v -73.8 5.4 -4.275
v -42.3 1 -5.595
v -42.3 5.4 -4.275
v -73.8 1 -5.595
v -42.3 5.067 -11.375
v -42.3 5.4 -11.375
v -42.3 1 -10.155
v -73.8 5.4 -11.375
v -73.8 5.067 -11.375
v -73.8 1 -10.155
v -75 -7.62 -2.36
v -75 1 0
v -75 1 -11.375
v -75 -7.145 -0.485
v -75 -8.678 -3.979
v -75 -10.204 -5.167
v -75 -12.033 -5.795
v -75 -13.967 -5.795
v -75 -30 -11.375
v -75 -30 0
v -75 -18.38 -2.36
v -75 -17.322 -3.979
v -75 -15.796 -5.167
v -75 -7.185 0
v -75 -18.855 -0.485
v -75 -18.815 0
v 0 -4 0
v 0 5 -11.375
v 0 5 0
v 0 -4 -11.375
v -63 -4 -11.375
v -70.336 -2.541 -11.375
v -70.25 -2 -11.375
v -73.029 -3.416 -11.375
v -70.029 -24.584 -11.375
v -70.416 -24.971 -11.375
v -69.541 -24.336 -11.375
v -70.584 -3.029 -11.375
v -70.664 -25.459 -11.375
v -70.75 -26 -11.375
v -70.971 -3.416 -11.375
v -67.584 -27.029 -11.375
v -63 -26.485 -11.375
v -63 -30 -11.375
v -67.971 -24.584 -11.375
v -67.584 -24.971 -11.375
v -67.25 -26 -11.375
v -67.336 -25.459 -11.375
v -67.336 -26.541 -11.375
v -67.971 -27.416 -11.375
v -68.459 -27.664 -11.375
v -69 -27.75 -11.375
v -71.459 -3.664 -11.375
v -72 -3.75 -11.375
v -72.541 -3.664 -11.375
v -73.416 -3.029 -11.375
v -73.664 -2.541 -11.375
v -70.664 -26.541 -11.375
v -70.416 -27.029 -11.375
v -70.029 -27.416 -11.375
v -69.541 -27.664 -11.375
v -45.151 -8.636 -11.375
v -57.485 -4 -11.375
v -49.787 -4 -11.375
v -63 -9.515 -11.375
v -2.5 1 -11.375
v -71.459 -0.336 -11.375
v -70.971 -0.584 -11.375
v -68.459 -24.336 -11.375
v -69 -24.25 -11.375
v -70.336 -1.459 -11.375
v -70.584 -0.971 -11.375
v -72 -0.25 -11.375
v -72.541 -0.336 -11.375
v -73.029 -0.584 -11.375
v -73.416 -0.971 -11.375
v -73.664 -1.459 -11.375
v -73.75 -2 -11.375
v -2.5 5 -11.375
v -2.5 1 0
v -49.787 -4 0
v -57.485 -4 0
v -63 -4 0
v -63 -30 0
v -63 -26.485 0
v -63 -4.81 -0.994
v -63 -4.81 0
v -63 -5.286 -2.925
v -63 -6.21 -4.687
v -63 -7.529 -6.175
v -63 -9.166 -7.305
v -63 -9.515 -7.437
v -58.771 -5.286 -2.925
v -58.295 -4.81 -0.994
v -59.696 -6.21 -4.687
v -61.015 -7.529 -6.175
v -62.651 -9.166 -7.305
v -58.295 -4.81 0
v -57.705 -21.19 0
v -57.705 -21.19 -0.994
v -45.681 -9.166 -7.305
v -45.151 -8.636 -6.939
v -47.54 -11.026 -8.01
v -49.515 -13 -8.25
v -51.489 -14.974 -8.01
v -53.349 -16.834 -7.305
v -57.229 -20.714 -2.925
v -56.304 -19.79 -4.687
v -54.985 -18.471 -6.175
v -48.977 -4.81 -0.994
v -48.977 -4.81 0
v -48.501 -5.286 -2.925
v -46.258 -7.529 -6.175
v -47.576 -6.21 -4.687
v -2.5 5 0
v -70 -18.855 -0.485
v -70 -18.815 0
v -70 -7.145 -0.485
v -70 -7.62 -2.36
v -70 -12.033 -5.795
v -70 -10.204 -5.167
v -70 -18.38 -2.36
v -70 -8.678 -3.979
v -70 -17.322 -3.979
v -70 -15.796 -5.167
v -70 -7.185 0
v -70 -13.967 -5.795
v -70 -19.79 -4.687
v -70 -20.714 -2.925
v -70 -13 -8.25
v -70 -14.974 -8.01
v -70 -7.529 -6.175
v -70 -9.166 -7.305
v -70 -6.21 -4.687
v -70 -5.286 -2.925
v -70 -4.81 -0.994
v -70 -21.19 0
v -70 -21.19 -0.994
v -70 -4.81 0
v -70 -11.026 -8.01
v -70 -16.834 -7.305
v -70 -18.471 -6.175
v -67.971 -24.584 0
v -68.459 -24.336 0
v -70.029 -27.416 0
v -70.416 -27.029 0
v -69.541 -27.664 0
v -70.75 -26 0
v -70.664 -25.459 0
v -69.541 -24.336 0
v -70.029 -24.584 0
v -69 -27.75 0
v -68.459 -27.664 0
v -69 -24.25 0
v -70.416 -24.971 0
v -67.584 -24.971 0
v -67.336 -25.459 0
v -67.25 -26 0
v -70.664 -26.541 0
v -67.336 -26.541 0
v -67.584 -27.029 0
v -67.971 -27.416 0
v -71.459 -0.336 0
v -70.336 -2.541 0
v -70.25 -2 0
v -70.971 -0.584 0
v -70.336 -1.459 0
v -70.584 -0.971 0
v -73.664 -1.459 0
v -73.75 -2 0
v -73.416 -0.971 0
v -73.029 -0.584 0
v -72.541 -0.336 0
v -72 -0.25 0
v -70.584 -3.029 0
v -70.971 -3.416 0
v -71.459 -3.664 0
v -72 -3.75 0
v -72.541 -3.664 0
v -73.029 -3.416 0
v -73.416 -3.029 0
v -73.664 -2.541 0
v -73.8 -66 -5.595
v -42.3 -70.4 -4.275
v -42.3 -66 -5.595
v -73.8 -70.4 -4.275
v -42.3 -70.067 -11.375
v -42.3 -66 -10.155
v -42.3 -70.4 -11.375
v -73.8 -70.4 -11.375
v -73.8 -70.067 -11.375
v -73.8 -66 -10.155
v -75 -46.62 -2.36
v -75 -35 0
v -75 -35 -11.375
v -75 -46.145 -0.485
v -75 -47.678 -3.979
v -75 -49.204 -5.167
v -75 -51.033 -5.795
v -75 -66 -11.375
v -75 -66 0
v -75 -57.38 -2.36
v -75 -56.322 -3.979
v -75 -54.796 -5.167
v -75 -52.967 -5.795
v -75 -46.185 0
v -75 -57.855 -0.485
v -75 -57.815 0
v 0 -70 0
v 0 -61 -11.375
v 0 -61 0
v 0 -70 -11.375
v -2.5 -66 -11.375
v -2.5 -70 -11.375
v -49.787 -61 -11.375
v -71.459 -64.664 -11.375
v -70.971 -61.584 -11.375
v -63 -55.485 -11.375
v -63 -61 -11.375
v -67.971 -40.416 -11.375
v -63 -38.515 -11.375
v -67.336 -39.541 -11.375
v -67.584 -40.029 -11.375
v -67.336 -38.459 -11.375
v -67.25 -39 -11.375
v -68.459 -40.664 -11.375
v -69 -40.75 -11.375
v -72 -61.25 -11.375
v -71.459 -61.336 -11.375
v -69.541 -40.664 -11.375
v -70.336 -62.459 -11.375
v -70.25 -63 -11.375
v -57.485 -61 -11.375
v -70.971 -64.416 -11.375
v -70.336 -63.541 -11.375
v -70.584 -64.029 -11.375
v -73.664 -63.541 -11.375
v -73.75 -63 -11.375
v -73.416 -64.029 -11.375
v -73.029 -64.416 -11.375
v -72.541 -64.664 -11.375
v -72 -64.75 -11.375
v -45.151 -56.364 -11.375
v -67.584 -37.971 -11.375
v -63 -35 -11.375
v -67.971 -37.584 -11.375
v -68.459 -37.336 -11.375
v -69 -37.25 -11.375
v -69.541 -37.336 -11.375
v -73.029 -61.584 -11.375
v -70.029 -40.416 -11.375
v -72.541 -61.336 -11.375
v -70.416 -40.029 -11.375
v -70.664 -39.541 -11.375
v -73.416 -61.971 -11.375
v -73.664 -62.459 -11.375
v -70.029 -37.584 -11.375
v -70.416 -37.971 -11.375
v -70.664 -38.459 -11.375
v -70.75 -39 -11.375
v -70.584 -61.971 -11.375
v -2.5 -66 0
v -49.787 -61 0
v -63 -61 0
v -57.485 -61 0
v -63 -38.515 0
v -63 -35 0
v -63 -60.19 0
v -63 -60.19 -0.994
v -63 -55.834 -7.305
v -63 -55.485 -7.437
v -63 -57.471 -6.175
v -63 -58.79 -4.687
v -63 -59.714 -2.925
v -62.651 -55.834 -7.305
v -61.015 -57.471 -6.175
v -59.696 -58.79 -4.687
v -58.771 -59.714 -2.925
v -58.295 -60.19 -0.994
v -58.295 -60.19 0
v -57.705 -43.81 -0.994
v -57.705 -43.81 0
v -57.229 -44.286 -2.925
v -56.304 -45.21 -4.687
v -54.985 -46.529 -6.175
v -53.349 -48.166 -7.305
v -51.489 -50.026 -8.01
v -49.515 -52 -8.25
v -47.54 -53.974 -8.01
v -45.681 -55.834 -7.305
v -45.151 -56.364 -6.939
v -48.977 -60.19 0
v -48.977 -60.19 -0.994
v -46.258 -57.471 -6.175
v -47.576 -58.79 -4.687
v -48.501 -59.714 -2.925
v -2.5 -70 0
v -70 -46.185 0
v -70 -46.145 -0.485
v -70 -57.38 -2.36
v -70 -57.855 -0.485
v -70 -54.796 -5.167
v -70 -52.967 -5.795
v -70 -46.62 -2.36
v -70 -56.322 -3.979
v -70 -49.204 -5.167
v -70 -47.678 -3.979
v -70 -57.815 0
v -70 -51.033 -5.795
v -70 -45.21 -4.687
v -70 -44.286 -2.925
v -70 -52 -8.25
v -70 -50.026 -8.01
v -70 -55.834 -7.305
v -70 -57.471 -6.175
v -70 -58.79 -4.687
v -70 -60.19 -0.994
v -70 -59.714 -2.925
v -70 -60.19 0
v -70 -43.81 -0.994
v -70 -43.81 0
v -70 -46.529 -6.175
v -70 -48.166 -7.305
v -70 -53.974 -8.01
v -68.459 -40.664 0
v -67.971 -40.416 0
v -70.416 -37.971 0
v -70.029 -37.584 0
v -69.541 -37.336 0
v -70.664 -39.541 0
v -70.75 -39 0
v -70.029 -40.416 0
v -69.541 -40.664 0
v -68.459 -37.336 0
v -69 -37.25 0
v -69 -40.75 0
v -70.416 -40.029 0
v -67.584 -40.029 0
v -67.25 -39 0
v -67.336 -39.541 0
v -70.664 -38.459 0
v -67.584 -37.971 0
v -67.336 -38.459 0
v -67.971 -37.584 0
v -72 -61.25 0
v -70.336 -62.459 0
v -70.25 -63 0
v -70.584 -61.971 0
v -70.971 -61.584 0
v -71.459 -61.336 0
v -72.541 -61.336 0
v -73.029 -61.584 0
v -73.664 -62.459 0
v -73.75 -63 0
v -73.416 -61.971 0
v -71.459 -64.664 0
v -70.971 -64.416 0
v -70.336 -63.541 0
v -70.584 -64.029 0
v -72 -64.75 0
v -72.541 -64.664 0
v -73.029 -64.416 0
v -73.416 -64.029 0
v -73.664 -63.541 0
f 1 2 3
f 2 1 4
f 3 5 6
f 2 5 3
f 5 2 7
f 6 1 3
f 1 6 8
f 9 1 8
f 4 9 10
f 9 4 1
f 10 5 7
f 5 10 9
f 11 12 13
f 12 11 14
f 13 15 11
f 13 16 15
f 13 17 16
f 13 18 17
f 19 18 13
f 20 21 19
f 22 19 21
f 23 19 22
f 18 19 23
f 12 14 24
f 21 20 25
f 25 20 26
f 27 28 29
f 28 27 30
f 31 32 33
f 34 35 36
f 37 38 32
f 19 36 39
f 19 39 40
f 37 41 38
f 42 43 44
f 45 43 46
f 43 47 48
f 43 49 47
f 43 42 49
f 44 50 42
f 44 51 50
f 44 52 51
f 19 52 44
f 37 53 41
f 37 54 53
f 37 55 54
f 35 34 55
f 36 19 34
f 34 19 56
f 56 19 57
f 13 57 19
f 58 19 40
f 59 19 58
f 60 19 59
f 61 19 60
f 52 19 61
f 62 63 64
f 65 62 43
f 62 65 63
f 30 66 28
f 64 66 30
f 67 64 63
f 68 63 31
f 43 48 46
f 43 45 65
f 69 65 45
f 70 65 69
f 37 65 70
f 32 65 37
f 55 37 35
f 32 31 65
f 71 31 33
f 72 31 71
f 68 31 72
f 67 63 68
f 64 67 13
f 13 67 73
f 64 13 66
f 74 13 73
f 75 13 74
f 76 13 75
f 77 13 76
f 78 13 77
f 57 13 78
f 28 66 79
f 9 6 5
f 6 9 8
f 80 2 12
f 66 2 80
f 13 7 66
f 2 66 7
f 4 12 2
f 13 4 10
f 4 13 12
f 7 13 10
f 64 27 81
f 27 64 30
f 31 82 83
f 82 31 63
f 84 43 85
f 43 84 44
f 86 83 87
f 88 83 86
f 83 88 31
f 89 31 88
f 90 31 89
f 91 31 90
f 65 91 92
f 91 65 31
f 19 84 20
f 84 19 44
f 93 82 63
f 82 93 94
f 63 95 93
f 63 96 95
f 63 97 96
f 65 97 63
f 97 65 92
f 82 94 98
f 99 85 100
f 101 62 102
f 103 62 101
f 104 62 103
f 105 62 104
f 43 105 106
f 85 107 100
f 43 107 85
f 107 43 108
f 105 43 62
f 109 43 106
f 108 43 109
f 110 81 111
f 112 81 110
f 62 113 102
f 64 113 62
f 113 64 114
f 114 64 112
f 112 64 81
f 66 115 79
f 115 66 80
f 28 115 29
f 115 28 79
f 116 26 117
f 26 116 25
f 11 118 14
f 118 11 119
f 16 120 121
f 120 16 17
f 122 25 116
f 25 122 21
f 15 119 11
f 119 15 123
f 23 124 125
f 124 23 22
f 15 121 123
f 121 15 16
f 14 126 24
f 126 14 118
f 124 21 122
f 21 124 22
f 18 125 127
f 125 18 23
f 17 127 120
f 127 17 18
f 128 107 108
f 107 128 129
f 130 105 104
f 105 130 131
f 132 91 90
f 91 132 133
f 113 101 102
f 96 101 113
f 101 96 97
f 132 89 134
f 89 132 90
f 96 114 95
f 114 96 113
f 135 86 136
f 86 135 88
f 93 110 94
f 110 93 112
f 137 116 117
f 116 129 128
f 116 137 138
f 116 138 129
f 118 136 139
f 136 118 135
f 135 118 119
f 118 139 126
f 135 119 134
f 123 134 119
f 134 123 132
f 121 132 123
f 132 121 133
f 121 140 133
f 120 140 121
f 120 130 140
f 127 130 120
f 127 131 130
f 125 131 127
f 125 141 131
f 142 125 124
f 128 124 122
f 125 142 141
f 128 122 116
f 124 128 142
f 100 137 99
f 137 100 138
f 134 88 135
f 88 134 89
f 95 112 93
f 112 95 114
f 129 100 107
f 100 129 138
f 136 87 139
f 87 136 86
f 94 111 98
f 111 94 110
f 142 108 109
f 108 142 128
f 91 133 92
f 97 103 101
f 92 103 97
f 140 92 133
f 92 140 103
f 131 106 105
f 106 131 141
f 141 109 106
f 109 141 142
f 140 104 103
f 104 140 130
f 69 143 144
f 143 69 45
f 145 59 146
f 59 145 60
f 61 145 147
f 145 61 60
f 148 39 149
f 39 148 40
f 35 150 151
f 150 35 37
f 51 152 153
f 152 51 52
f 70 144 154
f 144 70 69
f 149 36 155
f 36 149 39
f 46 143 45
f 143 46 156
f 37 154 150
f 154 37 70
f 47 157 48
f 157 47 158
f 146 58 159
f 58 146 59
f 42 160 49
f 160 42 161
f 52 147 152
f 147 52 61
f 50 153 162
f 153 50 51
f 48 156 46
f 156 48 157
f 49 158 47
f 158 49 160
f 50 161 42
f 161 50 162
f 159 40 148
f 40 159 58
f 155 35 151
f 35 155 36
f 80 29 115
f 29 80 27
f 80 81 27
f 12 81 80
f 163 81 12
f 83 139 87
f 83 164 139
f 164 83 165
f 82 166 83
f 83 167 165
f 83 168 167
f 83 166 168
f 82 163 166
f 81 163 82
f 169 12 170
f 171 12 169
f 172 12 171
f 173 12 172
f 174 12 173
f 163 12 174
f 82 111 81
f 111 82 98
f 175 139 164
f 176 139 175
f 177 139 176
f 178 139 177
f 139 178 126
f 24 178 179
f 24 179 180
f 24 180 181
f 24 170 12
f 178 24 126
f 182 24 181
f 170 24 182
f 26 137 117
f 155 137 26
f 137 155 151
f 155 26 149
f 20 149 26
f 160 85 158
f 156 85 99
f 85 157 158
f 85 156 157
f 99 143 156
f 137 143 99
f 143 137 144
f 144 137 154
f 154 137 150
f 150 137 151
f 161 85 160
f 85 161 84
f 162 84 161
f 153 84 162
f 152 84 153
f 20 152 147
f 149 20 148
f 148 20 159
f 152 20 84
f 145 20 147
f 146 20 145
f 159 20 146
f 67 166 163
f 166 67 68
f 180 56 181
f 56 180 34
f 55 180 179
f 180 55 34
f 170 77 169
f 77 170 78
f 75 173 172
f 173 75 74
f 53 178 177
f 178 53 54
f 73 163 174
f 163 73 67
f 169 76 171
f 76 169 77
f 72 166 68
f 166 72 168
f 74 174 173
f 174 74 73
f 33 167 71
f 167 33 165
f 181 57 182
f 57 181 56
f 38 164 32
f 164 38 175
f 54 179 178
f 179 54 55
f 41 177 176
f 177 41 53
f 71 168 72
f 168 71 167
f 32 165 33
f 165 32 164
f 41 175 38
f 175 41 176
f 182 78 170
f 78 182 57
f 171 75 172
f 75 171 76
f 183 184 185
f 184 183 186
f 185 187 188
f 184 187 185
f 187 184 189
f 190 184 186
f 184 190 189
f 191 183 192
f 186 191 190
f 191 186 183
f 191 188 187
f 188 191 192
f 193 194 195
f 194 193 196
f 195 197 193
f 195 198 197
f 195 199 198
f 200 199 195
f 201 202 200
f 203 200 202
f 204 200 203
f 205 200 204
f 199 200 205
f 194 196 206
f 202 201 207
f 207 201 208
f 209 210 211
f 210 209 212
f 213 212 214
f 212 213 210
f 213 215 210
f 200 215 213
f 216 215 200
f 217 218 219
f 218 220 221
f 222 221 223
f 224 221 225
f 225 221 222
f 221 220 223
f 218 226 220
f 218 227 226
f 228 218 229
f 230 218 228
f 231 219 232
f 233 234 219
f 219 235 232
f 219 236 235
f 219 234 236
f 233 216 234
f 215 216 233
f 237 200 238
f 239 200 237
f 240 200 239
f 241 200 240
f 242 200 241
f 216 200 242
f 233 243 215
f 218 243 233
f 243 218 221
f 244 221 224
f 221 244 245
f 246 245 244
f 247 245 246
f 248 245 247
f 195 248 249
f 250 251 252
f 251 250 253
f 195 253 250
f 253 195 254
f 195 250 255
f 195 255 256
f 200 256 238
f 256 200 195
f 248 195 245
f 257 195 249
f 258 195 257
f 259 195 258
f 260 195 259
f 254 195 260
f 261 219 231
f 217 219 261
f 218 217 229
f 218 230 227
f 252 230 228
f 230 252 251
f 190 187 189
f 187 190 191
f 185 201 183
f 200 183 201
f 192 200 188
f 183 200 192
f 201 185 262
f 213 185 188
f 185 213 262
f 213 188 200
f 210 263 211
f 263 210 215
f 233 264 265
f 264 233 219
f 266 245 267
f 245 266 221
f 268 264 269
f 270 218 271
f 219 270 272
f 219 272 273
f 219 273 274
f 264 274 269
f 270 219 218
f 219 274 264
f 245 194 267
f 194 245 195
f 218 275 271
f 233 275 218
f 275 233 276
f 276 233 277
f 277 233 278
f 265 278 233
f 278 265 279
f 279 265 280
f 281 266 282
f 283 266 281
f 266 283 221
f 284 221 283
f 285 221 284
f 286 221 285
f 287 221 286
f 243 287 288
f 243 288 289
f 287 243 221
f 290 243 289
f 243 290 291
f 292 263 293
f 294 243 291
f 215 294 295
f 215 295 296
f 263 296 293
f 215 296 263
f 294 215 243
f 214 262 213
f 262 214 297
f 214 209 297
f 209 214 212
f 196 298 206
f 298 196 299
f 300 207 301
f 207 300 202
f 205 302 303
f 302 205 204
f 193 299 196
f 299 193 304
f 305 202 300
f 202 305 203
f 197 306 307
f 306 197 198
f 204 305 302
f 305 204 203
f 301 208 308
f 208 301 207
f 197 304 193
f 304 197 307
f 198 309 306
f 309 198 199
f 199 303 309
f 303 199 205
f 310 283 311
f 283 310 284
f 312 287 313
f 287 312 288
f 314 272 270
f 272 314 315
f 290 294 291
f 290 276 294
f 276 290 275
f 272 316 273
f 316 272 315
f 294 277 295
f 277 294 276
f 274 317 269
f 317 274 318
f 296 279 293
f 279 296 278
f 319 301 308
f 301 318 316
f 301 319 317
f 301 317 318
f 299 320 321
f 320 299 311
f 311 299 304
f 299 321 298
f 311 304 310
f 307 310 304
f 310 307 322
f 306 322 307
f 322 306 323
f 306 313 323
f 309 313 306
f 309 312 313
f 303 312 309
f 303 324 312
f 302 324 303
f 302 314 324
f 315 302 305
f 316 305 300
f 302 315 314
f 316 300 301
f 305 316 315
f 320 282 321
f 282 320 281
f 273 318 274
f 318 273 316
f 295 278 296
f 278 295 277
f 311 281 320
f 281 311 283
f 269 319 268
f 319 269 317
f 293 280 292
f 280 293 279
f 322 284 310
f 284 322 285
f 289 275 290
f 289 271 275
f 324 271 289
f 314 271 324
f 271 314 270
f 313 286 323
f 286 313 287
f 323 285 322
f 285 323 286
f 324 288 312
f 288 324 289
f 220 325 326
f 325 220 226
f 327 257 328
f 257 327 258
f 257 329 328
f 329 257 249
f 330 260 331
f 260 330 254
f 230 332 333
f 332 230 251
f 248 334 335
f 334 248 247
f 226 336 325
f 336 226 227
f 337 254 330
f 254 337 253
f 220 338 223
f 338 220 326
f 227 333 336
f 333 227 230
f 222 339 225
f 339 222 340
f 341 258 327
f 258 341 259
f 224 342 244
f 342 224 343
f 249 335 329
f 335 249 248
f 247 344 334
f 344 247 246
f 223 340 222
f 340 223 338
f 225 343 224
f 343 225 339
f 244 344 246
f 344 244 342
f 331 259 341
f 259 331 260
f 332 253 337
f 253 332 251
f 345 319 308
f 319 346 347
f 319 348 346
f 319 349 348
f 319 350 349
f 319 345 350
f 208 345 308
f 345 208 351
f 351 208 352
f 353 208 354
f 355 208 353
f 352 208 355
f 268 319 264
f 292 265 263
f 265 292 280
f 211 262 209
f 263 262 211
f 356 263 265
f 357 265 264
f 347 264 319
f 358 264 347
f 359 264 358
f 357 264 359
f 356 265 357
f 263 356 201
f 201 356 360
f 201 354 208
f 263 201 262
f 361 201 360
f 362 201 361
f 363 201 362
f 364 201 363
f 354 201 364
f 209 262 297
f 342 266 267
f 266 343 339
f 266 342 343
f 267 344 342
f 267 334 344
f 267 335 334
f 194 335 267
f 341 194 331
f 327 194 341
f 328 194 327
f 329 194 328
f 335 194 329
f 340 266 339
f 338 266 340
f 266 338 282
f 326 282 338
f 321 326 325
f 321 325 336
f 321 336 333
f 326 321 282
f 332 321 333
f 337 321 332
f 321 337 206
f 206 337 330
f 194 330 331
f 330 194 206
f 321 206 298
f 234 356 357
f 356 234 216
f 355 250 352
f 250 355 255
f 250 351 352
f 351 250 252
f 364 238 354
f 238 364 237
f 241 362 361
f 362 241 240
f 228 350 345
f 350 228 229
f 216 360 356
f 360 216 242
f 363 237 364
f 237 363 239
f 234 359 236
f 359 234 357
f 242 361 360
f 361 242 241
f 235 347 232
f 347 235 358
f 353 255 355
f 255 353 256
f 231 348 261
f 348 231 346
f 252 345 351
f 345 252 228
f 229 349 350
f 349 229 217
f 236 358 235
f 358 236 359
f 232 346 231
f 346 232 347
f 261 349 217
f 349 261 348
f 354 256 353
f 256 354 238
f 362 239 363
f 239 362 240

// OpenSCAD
// file: ../../include.scad
//////////////////      END SECTION       //////////////////

	module added_pins(){
		difference(){
			union(){
				translate([30/(15/4),obj_leg*leg_length,30/(15/4)]) pin();
				translate([30/(15/4)+14.5,obj_leg*leg_length,30/(15/4)+14]) pin();
			}
			union(){
							translate([30/(15/4)+13.5,obj_leg*leg_length-20,30/(15/4)+5])cube(size=[2,40,15]);
							translate([30/(15/4)+7.5,obj_leg*leg_length-20,30/(15/4)+15])rotate([0,90,0]) cube(size=[2,40,15]);	

							translate([30/(15/4)-1,obj_leg*leg_length-20,30/(15/4)-8])cube(size=[2,40,15]);
							translate([30/(15/4)-10,obj_leg*leg_length-20,30/(15/4)+1])rotate([0,90,0]) cube(size=[2,40,15]);
			}
		}
	}
	module taken_pins() {
		translate([30/(15/4)+14,obj_leg*leg_length-10,30/(15/4)]) mirror_pin();
		translate([30/(15/4),obj_leg*leg_length-10,30/(15/4)+15]) mirror_pin();
	}


//////////////////      OTHER STUFF       //////////////////

	module holes() {
		rotate([0,0,90]) for(y=[0:other_holes])
		translate([obj_leg+y*15,-15.5,7.5]) union() {
			translate([7.5,0,15]) hole_up();
			hole_down();
		}
	}
	module extend_holes() {
	module top(){
		rotate([0,0,90]) for(y=[0:other_holes+1])
		translate([(30/4)+y*15,-15.5,7.5]) union() {
			translate([7.5,0,15]) hole_up();
		}
	}
	module bottom(){
		rotate([0,0,90]) for(y=[0:other_holes+2])
		translate([(30/4)+y*15,-15.5,7.5]) union() {
			hole_down();
		
}
	}
	union(){
		top();
		bottom();
	}
	}

	module hole() {
		union() {
			rotate([90, 90, 0]) cylinder(h=40, d=hole_pin_diameter, center=true);
			translate([0,7.5,0]) sphere(d=hole_ball_size);
			translate([0,-6,0]) sphere(d=hole_ball_size);
		}
	}
	module hole_up() {
		union() {
			rotate([90, 90, 0]) cylinder(h=40, d=hole_pin_diameter, center=true);
			translate([0,7.5,10]) cylinder(h=hole_pin_height, d=hole_pin_diameter, center=true);
			translate([0,-6,10]) cylinder(h=hole_pin_height, d=hole_pin_diameter, center=true);
			translate([0,7.5,0]) sphere(d=hole_ball_size);
			translate([0,-6,0]) sphere(d=hole_ball_size);
		}
	}
	module hole_down() {
		union() {
			rotate([90, 90, 0]) cylinder(h=40, d=hole_pin_diameter, center=true);
			translate([0,7.5,-10]) cylinder(h=hole_pin_height, d=hole_pin_diameter, center=true);
			translate([0,-6,-10]) cylinder(h=hole_pin_height, d=hole_pin_diameter, center=true);
			translate([0,7.5,0]) sphere(d=hole_ball_size);
			translate([0,-6,0]) sphere(d=hole_ball_size);
		}
	}
	module pin() {
		union() {
			rotate([90, 90, 0]) cylinder(h=pin_height, d=pin_diameter, center=true);
			translate([0,7.5,0]) sphere(d=ball_size);
		}
	}

	module mirror_pin() {
		rotate([90, 90, 0]) cylinder(h=hole_pin_height+small_number, d=hole_pin_diameter, center=true);
		translate([0,-(pin_height-(ball_size/2)),0]) sphere(d=ball_size);
	}


//////////////////      SOME RACK AND Z THINGS       //////////////////

module z_holes() {
    rotate([0,-90,0]) for(z=[0:z_hole_number])
    translate([22.5+z*15,16,-12])
        hole();
}

module pin_cuts() {
	union(){
		cube(size=[2,10,40], center=true);
		rotate([0,0,90]) cube(size=[2,10,40], center=true);
	}
}
module pin_uncut() {
	union(){
		rotate([0, 0, 90]) cylinder(h=hole_pin_height, d=hole_pin_diameter, center=true);
		translate([0,0,10]) sphere(d=ball_hole);
	}
}


module pin_out() {
	union(){
		rotate([0, 0, 90]) cylinder(h=pin_height, d=pin_diameter, center=true);
		translate([0,0,10]) sphere(d= ball_size);
	}
}


module pins_z(){
	difference() {
		pin_out();
		pin_cuts();
	}
}
//////////////////      RACK AND SLIDE     ///////////////////

module straight_pins() {
	for(z=[0:((((obj_leg*leg_length)*2)-(obj_leg*2))/3)/14.5]) rotate([-90,0,0]) translate([z*15,30/(15/4),14]) pins_z();
	for(z=[0:((((obj_leg*leg_length)*2)-(obj_leg*2))/3)/14.5]) rotate([-90,0,0]) translate([z*15,30/(15/4)-14,14]) pins_z();
}
module stagger_pins() {
	for(z=[0:((((obj_leg*leg_length)*2)-(obj_leg*2))/3)/14.5]) rotate([-90,0,0]) translate([z*15,30/(15/4),14]) pins_z();
	for(z=[0:((((obj_leg*leg_length)*2)-(obj_leg*2))/3)/14.5]) rotate([-90,0,0]) translate([z*15+7,30/(15/4)-14,14]) pins_z();
}


//////////////////      DOVE TAIL       //////////////////

module male_dovetail(height) {
	dovetail_3d(max_width,min_width,depth,height);
}

module dovetail_3d(max_width=11, min_width=5, depth=5, height=30) {
	linear_extrude(height=height, convexity=2)
		dovetail_2d(max_width,min_width,depth);
}

module dovetail_2d(max_width=11, min_width=5, depth=5) {
	angle=atan((max_width/2-min_width/2)/depth);
	echo("angle: ", angle);
	polygon(paths=[[0,1,2,3,0]], points=[[-min_width/2,0], [-max_width/2,depth], [max_width/2, depth], [min_width/2,0]]);
}

//bow tie
	module tie_end(height){
				rotate([0,0,0]) translate([0,-0.01,((obj_leg/2)/2)]) male_dovetail(height);
				rotate([0,90,0]) translate([0,-0.01,((obj_leg/2)/2)]) male_dovetail(height);
				rotate([0,180,0]) translate([0,-0.01,((obj_leg/2)/2)]) male_dovetail(height);
				rotate([0,-90,0]) translate([0,-0.01,((obj_leg/2)/2)]) male_dovetail(height);
	}

module bow_support(){
	difference(){
		intersection(){
			translate([-15,0,-15]) cube([30,9,30]);
			scale([1.05,1.05,1.05]) rotate([0,45,0]) tie_end();
		}
		cube([29.2,29.2,29.2], center=true);
	}
}

	module wrap(units){
	for (y = [-1:units-2]) // two iterations, z = -1, z = 1
	{
			translate([15, (y*30)+15, 15]){
			for (r = [0:4]) // two iterations, z = -1, z = 1
			{
				rotate([0,r*90,0]) translate([0,15,15]) rotate([-90,0,0])male_dovetail(height=30);
			}
		}
	}
	}
// file: ../../globals.scad
/*
Most things in this file is represented as one millimeter, so keep that in mind while changing things.
Some of the setting are not mm but at variables that you can set, such as 2*x=2x and you are setting what x is.
I will try to specify when things are variables and not exact measurements.
*/

//Virindi settings
dovetail_male_width_scale = 0.98;
dovetail_male_height_scale = 0.91;

obj_leg = 30;
leg_length = 5.5;
small_number = 0.001;
metal_core_rode_global = 5;


///////////////// number of holes /////////////////////
z_hole_number = 8;
other_holes = 8;

///////////////// Pins /////////////////////

//pins that poke out
ball_size = 10;
pin_height = 20;
pin_diameter = 6;


//holes
hole_ball_size = ball_size;
hole_pin_height = pin_height;
hole_pin_diameter = pin_diameter;

///////////////// Z THINGS /////////////////////

berring_slot_width = 7.5;
berring_slot_depth = 6.5;
metal_core_rode = 5;

///////////////// X THINGS /////////////////////

//male dove tails
max_width=8;
min_width=5;
depth=5;
height=obj_leg/2;

//female dove tails, this is found on the y mounts
girl_max_width=11;
girl_min_width=5;
girl_depth=5;
girl_height=obj_leg;


///////////////// Y THINGS /////////////////////
/*
The Y is so normal that all of those global variables at the top should change all of the setting in it, this section is set her incase there are variables set in the future development of this project.
*/
// main file
include <../../globals.scad>;
include <../../include.scad>;

hotend_depth = 75;
mounting_diamiter = 11.75;
top_diamiter = 16.5;
arm_thickness = 5;
snap_location = 47;
natch_height = 6;


module motor_mount_small(height=15){
	scale([.9,.9,.9]) 	translate([-8.75,1,snap_location]) male_dovetail(35);
}

module y_mount_added(){
	motor_mount_small();
	translate([1,-4+((10-arm_thickness)/2),hotend_depth/2]) cube([24.75,arm_thickness,hotend_depth], center=true);
    translate([1,-15,hotend_depth-(natch_height)]) cube([25,30,natch_height*2],center=true);
	translate([-4,-15,hotend_depth-15]) rotate([-45,0,0]) cube([15,30,natch_height*2],center=true);
	translate([1,1,0]) cube([25,8,5],center=true);
}

module y_mount_taken(){
        translate([0,-13,hotend_depth/2]) cylinder(h=70, d=mounting_diamiter);
	    translate([0,-13,0]) cylinder(h=70, d=top_diamiter);
		translate([0,-26,hotend_depth-natch_height]) rotate([0,-90,0]) cylinder(h=30, d=3.5, $fn=20);
		translate([0,-2,hotend_depth-natch_height+3]) rotate([0,-90,0]) cylinder(h=30, d=3.5, $fn=20);
}
module mount(){
	difference(){
		rotate([0,-90,0]){
			intersection(){
						translate([-15,-30,0]) cube([15,100,100]);
				difference(){
						y_mount_added();
						y_mount_taken();
				}
			}
					translate([-11.5,.7,37.5+(hotend_depth-80)]) cube([7,.3,42.5]);
		}
		translate([-hotend_depth/2,0,(-hotend_depth/2)-22.75/2]) cube([hotend_depth,hotend_depth,hotend_depth], center=true);
	}
}

mount();
translate([0,-65,0]) mirror([0,1,0]) mount();
